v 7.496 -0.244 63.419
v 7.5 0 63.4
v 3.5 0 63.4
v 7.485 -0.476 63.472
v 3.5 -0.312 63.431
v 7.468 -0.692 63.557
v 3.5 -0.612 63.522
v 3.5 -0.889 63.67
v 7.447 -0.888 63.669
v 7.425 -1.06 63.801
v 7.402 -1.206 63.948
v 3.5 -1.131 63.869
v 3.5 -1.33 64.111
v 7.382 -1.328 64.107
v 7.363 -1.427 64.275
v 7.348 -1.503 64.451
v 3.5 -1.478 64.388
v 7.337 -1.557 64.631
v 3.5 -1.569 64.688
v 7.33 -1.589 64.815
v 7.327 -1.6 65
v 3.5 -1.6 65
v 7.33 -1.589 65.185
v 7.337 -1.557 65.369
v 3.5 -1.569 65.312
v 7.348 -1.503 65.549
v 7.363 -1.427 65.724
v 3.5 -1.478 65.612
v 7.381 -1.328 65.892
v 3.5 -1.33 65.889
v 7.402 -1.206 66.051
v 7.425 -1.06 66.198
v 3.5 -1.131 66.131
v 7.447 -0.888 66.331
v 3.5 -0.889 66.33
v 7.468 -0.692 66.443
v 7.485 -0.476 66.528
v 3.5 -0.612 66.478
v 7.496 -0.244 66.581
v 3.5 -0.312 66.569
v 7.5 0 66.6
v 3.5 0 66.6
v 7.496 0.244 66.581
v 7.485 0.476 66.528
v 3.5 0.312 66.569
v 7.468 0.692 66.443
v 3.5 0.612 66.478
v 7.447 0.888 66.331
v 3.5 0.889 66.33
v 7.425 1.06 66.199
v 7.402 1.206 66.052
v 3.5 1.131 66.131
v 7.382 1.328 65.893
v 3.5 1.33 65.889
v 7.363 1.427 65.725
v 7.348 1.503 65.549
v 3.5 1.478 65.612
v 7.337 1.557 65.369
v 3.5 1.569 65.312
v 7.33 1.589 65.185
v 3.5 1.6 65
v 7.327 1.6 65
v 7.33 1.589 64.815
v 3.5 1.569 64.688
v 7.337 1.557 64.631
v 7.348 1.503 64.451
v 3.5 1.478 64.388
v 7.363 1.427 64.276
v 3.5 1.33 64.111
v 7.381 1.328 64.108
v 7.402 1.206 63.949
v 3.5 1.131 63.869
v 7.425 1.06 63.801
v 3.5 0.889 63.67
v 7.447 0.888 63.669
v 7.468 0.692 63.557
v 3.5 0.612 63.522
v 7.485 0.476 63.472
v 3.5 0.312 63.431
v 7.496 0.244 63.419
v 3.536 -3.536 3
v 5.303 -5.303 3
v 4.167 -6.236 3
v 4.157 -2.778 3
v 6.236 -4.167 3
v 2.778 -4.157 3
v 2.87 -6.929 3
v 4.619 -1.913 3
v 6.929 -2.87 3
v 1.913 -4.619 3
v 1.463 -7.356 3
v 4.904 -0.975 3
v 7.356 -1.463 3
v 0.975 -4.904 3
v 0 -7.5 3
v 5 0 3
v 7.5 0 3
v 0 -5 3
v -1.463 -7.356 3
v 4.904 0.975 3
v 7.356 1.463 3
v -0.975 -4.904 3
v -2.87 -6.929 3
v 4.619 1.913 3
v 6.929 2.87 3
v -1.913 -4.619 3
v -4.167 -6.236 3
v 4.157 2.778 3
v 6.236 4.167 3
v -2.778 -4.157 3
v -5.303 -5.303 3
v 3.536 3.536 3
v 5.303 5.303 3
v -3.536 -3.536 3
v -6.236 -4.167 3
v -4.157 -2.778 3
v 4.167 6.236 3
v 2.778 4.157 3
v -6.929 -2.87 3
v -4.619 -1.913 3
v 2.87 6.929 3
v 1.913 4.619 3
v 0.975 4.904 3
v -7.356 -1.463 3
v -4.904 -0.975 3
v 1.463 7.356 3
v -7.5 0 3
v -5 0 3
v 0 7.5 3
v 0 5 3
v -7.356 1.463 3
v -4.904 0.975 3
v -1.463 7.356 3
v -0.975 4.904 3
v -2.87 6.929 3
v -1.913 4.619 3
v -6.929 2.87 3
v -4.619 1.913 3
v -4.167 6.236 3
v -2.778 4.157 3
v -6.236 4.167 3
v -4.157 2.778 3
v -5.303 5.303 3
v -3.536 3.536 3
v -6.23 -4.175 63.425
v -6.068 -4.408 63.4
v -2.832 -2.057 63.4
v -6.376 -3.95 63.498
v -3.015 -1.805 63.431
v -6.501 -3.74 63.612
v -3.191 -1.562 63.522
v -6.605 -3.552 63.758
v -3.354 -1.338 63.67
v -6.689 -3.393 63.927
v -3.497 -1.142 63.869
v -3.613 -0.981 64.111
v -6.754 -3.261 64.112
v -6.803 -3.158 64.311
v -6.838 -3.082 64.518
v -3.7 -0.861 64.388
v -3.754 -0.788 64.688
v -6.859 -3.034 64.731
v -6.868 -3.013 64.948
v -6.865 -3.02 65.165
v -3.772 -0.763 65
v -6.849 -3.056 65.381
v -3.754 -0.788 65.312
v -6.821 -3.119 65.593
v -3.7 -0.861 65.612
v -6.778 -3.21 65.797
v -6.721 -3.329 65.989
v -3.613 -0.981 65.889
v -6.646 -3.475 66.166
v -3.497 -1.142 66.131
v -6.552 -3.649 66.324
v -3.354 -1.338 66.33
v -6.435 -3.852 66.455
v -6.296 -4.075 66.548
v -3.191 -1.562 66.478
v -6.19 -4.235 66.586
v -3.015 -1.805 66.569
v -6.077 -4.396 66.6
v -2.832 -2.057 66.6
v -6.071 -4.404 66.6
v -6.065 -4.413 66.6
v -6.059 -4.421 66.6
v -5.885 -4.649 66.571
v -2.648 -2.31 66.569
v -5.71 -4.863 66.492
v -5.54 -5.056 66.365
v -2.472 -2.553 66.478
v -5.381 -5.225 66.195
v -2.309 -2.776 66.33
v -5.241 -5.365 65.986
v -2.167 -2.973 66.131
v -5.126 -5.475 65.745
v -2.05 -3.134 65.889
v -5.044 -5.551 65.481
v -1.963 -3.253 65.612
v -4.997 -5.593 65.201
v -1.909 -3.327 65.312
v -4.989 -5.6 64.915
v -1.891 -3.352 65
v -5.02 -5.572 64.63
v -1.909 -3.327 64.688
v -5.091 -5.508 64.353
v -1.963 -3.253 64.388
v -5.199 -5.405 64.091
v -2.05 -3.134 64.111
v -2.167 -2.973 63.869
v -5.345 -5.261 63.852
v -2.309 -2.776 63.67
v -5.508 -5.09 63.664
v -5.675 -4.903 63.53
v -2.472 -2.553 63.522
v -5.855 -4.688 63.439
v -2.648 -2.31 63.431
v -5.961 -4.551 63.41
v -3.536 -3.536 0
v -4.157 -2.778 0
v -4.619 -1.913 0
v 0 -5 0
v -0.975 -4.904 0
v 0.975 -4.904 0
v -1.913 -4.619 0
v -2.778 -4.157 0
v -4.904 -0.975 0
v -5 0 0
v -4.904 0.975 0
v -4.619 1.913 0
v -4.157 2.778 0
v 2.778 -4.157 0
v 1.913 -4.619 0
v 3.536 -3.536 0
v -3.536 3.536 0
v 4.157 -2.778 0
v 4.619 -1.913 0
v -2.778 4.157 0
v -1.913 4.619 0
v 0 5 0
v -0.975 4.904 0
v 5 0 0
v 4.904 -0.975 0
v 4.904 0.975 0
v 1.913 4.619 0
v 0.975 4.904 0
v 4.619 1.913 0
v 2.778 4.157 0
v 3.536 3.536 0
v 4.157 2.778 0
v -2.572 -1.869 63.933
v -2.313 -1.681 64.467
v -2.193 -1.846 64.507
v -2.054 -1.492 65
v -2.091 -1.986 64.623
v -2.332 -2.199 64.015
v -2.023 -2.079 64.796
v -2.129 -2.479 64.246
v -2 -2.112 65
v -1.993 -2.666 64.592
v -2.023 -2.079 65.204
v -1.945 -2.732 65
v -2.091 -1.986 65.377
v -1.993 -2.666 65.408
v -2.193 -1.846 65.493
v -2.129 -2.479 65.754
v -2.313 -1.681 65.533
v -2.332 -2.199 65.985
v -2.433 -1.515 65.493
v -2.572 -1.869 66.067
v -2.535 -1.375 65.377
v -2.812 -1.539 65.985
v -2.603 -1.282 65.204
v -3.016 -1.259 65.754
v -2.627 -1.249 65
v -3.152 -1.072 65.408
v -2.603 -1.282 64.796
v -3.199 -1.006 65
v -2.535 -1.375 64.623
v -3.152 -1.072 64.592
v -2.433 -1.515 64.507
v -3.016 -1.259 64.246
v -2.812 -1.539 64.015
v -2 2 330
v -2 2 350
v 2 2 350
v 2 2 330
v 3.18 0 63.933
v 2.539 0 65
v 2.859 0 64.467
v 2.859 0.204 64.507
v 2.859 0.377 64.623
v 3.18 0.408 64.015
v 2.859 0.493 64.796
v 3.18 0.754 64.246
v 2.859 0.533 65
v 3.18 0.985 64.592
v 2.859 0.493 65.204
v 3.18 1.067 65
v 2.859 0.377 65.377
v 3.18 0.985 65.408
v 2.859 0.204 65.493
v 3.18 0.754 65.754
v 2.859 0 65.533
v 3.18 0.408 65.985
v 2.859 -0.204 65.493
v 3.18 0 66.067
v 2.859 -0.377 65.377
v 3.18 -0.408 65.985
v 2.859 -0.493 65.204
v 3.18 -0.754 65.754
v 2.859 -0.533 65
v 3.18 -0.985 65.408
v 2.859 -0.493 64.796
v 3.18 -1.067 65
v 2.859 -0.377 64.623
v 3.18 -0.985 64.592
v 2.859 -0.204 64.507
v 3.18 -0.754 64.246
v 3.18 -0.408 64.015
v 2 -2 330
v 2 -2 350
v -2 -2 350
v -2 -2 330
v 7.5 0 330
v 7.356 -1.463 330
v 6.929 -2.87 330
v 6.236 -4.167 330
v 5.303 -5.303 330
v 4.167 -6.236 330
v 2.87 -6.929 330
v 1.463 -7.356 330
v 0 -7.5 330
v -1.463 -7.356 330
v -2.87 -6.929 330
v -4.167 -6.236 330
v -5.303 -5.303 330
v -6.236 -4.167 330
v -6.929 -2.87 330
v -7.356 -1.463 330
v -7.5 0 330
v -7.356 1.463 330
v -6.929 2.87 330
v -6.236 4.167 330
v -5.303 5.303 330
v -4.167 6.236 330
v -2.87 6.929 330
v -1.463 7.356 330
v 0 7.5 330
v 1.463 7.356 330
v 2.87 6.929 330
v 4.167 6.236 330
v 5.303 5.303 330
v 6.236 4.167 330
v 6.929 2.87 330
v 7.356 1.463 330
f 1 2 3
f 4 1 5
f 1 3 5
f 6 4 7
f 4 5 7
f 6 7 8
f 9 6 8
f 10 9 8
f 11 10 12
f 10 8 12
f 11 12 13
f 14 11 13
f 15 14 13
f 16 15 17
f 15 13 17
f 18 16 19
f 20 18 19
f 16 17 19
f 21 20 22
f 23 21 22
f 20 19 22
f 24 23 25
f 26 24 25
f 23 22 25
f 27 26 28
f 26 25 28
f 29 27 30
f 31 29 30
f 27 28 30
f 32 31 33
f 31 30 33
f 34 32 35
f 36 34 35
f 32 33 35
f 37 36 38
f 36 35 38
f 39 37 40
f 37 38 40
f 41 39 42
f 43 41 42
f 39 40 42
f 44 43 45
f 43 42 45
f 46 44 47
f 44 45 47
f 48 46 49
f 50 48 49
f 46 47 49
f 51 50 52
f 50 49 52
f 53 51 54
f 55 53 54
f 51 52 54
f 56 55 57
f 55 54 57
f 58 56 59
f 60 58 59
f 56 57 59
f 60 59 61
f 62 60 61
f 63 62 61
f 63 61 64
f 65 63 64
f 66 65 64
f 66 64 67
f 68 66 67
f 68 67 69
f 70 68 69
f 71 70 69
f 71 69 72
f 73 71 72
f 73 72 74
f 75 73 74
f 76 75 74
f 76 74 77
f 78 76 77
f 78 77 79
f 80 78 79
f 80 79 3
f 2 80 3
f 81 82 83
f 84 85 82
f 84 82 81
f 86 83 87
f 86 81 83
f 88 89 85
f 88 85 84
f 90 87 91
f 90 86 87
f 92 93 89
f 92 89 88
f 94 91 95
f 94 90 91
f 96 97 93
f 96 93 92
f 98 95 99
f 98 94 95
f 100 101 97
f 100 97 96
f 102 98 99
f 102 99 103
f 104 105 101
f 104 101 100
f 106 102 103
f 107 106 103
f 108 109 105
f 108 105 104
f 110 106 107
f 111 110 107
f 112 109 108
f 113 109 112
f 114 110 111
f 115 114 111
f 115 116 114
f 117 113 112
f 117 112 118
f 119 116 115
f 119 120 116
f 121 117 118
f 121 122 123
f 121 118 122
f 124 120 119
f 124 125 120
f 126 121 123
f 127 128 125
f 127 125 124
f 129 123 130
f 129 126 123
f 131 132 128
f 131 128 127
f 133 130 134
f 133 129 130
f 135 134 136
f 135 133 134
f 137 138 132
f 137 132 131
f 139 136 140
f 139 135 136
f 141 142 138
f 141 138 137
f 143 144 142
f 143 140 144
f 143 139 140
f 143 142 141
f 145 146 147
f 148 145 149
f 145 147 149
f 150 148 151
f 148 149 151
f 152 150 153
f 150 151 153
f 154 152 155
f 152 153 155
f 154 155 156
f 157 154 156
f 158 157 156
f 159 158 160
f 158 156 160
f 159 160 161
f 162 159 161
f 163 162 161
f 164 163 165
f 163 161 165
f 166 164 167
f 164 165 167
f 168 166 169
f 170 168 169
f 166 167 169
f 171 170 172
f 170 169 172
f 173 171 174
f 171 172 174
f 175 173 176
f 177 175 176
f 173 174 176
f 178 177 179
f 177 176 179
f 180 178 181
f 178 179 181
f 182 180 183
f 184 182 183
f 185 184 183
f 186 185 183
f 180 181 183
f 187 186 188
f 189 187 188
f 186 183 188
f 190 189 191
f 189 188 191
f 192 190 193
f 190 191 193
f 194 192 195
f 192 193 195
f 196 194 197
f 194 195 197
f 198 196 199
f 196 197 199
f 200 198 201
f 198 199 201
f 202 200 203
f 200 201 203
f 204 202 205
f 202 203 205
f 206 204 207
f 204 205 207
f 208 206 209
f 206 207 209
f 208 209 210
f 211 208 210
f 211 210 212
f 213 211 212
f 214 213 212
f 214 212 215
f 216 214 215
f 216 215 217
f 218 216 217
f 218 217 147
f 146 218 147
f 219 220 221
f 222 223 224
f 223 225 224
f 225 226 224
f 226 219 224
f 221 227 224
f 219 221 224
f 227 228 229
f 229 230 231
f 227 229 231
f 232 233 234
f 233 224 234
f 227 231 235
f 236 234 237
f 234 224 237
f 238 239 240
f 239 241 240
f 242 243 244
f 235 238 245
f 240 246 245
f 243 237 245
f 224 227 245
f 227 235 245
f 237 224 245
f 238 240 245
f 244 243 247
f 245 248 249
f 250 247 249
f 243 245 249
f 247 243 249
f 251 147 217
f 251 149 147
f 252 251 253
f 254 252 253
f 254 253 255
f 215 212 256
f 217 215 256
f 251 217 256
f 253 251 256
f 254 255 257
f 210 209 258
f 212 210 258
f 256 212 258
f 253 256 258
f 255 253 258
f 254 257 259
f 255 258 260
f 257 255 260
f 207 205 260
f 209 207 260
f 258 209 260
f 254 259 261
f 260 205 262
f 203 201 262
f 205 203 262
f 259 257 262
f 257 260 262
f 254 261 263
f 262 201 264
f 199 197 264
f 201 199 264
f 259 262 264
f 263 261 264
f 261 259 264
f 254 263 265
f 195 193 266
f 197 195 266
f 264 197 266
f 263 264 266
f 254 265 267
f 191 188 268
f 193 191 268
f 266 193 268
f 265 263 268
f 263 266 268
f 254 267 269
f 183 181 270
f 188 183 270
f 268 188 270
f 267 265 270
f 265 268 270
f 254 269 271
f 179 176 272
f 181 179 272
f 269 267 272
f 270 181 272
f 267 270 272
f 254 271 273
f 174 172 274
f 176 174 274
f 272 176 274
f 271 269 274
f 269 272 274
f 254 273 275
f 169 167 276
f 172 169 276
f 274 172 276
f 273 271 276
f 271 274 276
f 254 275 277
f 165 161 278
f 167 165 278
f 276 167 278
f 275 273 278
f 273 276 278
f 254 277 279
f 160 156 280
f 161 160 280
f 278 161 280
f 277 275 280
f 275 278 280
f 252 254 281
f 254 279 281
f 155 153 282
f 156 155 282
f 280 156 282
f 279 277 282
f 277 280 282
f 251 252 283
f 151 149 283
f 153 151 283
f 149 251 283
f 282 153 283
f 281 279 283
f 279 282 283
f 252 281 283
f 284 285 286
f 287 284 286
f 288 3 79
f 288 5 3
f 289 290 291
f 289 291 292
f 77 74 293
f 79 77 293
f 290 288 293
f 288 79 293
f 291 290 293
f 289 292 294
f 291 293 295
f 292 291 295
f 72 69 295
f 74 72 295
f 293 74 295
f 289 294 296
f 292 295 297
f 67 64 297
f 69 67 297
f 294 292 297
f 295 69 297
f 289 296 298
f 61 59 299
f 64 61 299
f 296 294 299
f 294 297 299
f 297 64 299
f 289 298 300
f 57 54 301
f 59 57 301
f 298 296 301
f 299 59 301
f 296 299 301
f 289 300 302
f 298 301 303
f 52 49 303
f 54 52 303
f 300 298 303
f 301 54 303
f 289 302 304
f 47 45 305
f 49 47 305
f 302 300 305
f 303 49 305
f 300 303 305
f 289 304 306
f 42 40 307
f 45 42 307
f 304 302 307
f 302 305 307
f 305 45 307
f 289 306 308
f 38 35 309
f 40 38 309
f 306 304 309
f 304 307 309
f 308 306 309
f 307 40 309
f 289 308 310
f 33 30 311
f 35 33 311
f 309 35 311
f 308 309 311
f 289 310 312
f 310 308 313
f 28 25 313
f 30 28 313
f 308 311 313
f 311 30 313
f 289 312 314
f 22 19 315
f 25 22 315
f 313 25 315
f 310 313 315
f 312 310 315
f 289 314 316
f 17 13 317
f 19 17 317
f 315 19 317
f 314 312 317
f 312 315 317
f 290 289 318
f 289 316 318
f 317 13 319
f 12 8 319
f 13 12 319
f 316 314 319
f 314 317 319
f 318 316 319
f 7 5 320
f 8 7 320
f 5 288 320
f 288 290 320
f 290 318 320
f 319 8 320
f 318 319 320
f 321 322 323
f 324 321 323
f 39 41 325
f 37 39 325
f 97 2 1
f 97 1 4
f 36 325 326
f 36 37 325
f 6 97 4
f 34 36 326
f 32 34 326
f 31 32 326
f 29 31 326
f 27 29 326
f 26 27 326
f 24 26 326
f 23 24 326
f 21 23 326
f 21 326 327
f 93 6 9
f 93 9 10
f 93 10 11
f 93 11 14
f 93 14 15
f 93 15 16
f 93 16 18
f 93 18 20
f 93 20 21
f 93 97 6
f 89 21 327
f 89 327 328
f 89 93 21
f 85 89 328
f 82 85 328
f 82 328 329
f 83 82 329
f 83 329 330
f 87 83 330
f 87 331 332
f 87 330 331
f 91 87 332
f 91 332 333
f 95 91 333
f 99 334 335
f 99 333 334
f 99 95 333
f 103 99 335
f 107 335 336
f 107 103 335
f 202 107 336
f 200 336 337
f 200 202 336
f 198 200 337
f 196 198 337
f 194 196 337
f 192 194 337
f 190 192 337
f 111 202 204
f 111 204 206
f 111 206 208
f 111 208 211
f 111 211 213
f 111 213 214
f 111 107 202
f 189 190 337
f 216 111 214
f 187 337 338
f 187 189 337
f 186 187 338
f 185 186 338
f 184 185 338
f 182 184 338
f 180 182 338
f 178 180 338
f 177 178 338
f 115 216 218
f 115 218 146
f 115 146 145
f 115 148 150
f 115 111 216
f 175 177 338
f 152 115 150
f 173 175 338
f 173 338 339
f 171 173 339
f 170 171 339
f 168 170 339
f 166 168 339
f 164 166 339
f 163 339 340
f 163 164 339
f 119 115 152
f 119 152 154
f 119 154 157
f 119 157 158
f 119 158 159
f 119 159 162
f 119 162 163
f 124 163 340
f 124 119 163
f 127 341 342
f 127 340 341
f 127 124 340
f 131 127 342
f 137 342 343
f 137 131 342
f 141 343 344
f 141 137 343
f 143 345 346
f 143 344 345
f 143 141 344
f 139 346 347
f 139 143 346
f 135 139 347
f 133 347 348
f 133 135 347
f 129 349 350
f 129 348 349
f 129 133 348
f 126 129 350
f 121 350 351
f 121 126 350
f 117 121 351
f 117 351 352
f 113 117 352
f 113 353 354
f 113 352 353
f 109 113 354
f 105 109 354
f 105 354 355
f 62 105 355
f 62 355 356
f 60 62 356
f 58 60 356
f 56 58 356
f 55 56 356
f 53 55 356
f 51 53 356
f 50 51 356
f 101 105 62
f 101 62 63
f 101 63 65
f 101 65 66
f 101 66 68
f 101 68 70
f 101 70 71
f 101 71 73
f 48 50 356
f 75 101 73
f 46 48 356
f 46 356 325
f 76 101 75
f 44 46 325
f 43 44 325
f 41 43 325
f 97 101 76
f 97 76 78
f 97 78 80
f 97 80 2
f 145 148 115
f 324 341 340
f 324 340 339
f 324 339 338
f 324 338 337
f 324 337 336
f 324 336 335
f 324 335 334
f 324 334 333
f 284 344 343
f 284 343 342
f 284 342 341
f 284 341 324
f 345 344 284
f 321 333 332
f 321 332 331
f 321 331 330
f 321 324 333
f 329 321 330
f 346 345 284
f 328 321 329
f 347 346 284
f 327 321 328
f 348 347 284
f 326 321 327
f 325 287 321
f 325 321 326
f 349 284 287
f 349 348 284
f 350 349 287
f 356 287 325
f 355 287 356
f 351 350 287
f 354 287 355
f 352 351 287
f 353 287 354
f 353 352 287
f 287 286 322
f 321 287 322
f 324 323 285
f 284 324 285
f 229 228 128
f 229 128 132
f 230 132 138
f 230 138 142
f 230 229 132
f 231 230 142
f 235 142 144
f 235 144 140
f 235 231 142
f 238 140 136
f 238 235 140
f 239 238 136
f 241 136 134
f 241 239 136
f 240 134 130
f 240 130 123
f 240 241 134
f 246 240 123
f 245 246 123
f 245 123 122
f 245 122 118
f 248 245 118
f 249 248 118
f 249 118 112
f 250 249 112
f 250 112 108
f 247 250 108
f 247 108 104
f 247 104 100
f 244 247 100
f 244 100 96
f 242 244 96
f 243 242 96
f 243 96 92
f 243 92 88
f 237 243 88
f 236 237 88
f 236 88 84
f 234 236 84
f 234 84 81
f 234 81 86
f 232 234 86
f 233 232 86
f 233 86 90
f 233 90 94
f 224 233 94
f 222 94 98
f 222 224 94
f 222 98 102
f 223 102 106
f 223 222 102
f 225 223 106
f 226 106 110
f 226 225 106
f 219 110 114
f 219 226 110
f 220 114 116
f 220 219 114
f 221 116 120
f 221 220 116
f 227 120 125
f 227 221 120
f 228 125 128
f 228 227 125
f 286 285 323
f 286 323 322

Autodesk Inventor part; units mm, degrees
ref_plane "YZ Plane" through (0, 0, 0) normal (1, 0, 0) x (0, 1, 0)
sketch "Skizze1" plane through (0, 0, 0) normal (0, 0, 1) x (1, 0, 0)
  circle A0 centre (0, 0) radius 7.5
  dimension "d0" = 15
extrude "Extrusion1" add sketch "Skizze1" along normal blind 330
sketch "Skizze2" plane through (0, 0, 330) normal (0, 0, 1) x (1, 0, 0)
  point P0 (0, 0)
sketch "Skizze5" plane through (0, 0, 330) normal (0, 0, 1) x (1, 0, 0)
  line L0 (0, 0) -> (0, 2)
  line L1 (0, 2) -> (2, 2)
  line L2 (2, 2) -> (2, -2)
  line L3 (2, -2) -> (-2, -2)
  line L4 (-2, -2) -> (-2, 2)
  line L5 (-2, 2) -> (0, 2)
  dimension "d8" = 2
  dimension "d9" = 2
  dimension "d10" = 4
  dimension "d11" = 4
  dimension "d12" = 4
extrude "Extrusion4" add sketch "Skizze5" along normal blind 20
sketch "Skizze6" plane through (0, 0, 330) normal (0, 0, 1) x (1, 0, 0)
  line L0 (0, 0) -> (-6.0676, -4.4084)
  circle A0 centre (0, 0) radius 7.5 projected
  line L1 (0, 0) -> (7.5, 0) construction
  line L2 (0, 0) -> (7.5, 0)
  line L3 (2, -2) -> (2, 2) projected
  dimension "d15" = 144
ref_plane "Arbeitsebene1" through (-6.0676, -4.4084, 330) normal (-0.809017, -0.5877853, 0) x (0.5877853, -0.809017, 0)
sketch "Skizze7" plane through (-6.0676, -4.4084, 330) normal (-0.809017, -0.5877853, 0) x (0.5877853, -0.809017, 0)
  line L0 (7.5, 0) -> (-7.5, 0) projected
  line L1 (0, 0) -> (0, -265)
  line L2 (-15, -336) -> (15, -336) projected
  point P0 (0, -330)
  dimension "d16" = 265
hole "Bohrung1" at (-6.0676, -4.4084, 65) direction (0.809017, 0.5877853, 0) diameter 3.2 depth 4 tip angle 118
ref_plane "Arbeitsebene2" through (7.5, 0, 330) normal (1, 0, 0) x (0, 1, 0)
sketch "Skizze8" plane through (7.5, 0, 330) normal (1, 0, 0) x (0, 1, 0)
  line L0 (7.5, 0) -> (-7.5, 0) projected
  line L1 (0, 0) -> (0, -265)
  point P0 (0, -330)
  dimension "d24" = 265
hole "Bohrung2" at (7.5, 0, 65) direction (-1, 0, 0) diameter 3.2 depth 4 tip angle 118
sketch "Skizze9" plane through (0, 0, 0) normal (0, 0, -1) x (-1, 0, 0)
  circle A0 centre (0, 0) radius 5
  circle A1 centre (0, 0) radius 7.5
  dimension "d32" = 10
extrude "Extrusion5" cut sketch "Skizze9" against normal blind 3
properties part number "Welle" material "Stahl"
